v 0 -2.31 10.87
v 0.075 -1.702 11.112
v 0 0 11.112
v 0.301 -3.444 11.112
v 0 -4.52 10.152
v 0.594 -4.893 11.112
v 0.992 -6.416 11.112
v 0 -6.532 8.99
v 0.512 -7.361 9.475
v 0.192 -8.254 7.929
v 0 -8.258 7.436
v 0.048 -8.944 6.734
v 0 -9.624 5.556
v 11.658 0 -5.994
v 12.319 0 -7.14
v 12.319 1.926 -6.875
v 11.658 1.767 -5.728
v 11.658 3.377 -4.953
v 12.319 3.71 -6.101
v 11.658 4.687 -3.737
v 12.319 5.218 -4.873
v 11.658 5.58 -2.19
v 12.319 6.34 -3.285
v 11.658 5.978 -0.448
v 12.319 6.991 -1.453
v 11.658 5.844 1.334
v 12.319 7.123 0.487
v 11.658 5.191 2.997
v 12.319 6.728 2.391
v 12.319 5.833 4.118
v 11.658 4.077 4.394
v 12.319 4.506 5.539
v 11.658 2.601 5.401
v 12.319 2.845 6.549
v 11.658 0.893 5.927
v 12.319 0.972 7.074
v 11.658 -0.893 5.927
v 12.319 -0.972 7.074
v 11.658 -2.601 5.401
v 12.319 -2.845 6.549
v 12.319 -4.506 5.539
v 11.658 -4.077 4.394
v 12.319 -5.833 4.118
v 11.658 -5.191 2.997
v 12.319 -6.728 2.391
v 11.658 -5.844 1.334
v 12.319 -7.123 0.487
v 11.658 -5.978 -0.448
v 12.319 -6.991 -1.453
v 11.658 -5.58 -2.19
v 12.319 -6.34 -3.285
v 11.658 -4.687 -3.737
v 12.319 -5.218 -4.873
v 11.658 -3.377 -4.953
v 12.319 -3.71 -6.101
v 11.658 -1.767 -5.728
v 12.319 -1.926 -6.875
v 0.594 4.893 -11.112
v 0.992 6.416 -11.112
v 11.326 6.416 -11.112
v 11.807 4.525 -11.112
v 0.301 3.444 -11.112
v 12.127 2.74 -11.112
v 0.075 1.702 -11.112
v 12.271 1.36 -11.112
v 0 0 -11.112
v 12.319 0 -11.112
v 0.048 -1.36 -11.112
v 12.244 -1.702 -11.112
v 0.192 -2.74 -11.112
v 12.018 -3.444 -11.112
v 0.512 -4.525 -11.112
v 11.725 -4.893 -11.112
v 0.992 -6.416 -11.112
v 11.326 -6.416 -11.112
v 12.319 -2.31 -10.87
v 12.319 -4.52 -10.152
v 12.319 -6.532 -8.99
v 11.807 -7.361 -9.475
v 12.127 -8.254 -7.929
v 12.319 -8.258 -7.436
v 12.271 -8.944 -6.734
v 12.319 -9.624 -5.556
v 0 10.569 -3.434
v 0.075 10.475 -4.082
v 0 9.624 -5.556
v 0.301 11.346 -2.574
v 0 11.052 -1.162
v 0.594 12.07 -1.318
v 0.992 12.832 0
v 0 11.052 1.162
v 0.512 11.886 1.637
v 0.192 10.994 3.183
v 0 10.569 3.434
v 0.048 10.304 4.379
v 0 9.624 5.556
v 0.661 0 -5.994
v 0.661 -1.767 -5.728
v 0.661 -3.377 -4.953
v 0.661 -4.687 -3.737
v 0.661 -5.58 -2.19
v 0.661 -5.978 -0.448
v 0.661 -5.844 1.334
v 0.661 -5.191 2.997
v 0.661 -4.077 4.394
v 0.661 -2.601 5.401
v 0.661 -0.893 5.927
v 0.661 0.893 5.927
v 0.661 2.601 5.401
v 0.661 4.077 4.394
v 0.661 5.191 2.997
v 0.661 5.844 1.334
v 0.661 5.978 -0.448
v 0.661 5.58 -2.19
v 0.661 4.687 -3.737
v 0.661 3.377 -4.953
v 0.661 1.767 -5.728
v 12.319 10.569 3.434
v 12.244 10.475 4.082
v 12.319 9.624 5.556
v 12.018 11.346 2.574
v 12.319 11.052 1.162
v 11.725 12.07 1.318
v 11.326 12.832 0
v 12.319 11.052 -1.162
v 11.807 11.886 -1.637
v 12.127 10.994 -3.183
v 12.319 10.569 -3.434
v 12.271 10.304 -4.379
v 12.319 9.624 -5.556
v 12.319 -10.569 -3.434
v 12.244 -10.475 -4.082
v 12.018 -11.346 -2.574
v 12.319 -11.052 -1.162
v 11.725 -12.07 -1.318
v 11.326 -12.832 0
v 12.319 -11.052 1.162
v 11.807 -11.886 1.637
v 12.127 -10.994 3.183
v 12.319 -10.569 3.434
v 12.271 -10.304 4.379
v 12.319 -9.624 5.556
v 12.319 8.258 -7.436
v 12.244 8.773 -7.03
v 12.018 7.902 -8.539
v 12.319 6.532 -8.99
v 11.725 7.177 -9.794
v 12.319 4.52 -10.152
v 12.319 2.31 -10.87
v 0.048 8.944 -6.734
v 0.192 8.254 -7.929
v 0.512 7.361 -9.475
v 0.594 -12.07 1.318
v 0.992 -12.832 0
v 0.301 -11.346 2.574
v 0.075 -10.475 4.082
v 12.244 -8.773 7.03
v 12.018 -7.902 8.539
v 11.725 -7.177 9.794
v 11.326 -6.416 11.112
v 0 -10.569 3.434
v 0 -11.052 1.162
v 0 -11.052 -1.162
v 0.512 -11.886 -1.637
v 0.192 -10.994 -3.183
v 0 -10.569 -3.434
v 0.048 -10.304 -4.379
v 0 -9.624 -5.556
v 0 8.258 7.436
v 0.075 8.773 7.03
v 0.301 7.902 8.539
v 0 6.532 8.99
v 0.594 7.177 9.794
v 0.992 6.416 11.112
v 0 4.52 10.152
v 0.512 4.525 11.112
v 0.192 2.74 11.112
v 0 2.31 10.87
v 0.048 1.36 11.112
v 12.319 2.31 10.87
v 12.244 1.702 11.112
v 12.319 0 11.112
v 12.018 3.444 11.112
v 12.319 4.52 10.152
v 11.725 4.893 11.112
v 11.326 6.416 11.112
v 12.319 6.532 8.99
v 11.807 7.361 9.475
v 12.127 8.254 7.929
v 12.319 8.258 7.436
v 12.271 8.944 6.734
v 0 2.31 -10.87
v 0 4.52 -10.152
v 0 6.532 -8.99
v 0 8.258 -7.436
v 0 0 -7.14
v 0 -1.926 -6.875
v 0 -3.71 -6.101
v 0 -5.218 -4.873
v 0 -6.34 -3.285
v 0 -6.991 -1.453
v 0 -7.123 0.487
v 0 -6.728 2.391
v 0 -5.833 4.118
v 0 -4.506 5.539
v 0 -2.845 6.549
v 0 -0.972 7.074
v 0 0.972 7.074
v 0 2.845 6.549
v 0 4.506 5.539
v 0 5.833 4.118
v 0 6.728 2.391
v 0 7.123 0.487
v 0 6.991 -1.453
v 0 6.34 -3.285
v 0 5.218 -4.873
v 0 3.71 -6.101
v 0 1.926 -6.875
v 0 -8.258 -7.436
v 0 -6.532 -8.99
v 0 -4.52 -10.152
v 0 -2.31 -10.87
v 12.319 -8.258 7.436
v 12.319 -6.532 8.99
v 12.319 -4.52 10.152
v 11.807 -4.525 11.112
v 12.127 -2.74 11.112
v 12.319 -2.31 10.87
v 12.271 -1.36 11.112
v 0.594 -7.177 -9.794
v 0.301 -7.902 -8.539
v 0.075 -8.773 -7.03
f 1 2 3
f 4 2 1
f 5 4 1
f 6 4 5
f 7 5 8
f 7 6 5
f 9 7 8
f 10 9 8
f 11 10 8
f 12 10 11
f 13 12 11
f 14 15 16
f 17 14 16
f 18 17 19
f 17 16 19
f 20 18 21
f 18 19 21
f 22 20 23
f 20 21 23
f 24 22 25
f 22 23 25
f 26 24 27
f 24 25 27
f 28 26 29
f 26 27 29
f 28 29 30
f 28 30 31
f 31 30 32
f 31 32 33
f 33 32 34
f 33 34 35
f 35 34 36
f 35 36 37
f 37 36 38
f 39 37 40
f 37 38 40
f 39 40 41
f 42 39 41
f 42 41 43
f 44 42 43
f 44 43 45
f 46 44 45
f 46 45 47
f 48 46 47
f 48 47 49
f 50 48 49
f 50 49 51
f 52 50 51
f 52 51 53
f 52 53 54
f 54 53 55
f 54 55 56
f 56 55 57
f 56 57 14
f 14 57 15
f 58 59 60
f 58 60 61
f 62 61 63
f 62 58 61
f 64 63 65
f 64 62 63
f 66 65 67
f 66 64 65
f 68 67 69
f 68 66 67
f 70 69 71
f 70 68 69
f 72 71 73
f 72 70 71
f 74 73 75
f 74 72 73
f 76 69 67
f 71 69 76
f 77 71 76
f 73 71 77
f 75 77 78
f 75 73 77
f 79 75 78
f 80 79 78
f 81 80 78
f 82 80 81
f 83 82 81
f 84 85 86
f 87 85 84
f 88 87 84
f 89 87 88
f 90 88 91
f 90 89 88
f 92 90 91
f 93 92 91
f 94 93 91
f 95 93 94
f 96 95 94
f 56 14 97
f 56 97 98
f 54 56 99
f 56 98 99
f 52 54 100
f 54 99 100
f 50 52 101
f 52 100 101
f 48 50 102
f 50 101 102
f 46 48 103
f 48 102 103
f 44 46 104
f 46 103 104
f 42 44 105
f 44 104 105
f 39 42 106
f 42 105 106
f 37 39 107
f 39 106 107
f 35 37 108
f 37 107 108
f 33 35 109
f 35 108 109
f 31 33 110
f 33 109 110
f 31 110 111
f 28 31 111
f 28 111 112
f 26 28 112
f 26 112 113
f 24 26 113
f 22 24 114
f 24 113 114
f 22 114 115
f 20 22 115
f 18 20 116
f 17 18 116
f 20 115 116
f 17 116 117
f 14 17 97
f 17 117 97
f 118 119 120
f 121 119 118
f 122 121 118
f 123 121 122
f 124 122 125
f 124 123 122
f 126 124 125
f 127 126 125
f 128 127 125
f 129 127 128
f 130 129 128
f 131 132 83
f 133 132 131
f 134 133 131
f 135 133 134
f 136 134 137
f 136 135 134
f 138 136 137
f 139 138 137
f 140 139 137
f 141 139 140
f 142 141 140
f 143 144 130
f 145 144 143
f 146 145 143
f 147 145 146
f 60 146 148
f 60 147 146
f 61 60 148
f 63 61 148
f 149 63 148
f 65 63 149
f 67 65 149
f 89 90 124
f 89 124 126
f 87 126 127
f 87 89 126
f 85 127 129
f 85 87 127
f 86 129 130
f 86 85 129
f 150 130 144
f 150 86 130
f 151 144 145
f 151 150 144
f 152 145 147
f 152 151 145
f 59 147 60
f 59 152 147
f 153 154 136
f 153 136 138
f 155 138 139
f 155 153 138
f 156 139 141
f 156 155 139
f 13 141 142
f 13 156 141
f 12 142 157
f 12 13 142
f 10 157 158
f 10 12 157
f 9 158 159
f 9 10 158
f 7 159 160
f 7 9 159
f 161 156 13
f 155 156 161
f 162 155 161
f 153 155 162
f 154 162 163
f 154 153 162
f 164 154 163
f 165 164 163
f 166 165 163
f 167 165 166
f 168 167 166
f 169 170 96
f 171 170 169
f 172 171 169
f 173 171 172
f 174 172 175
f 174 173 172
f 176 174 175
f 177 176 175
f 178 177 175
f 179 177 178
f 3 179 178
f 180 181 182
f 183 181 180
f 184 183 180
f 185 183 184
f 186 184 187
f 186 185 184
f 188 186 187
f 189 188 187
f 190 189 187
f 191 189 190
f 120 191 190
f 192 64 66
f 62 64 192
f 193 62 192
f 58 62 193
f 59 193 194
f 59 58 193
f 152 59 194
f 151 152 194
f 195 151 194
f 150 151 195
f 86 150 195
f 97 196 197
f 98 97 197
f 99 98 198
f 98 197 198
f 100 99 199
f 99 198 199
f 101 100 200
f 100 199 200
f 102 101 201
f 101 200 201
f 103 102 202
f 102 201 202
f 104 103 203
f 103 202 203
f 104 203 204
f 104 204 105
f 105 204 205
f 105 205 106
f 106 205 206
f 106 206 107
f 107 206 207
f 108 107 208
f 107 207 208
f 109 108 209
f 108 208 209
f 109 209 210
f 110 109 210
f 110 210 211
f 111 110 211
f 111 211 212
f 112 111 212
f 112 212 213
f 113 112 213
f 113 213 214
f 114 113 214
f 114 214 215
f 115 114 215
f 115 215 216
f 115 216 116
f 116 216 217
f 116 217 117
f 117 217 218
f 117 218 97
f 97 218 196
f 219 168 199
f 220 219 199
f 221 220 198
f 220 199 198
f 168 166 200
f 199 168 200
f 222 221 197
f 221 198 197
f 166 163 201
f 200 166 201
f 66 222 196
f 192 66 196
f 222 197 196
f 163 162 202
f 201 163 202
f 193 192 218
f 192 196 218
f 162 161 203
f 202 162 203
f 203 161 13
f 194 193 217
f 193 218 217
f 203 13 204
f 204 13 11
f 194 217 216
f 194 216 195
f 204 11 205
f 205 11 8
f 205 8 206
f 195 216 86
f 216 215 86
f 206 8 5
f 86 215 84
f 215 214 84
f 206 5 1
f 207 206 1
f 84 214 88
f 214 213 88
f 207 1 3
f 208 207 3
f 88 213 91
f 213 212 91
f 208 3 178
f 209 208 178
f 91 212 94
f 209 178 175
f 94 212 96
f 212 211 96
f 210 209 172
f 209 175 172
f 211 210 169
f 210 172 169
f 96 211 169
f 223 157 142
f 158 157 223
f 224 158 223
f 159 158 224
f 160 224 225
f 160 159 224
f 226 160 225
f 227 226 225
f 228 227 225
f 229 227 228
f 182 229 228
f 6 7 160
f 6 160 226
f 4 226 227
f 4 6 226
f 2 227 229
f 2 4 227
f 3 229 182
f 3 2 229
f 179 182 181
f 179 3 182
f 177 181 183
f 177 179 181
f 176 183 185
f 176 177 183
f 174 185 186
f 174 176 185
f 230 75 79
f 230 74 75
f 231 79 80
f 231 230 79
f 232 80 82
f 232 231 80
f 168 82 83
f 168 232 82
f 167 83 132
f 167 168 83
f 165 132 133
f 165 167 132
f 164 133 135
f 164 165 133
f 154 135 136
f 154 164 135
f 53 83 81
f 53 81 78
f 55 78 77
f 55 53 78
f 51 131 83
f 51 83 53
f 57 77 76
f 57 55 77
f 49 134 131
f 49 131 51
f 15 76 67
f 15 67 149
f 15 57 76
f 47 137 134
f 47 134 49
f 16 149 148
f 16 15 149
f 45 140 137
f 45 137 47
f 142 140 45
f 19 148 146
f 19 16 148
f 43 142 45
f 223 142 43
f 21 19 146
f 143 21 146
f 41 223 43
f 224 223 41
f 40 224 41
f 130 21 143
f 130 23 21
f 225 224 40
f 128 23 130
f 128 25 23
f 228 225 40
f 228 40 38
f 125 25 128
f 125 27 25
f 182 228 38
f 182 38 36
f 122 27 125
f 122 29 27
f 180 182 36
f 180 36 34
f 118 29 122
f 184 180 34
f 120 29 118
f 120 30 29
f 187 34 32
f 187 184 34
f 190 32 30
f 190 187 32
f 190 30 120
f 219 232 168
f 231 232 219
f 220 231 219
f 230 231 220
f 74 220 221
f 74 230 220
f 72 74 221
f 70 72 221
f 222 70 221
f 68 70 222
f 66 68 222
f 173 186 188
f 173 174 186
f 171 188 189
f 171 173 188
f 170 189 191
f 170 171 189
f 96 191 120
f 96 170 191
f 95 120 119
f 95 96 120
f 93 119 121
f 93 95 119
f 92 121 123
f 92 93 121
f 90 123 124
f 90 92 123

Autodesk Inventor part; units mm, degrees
ref_plane "YZ Plane" through (0, 0, 0) normal (1, 0, 0) x (0, 1, 0)
ref_plane "XZ Plane" through (0, 0, 0) normal (0, 1, 0) x (-1, 0, 0)
sketch "Sketch1" plane through (0, 0, 0) normal (1, 0, 0) x (0, 1, 0)
  line L0 (-12.8316, 0) -> (-6.4158, 11.1125)
  line L1 (-6.4158, 11.1125) -> (6.4158, 11.1125)
  line L2 (6.4158, 11.1125) -> (12.8316, 0)
  line L3 (12.8316, 0) -> (6.4158, -11.1125)
  line L4 (6.4158, -11.1125) -> (-6.4158, -11.1125)
  line L5 (-6.4158, -11.1125) -> (-12.8316, 0)
  point P0 (0, 0)
  point P1 (0, 0)
  dimension "d0" = 25.6632
extrude "Body" add sketch "Sketch1" along normal blind 12.319
sketch "Sketch2" plane through (0, 0, 0) normal (0, 0, 1) x (1, 0, 0)
  line L0 (0, 6.4158) -> (0, 12.8316) projected
  line L1 (0, 12.8316) -> (12.319, 12.8316) projected
  line L2 (12.319, 6.4158) -> (12.319, 12.8316) projected
  line L3 (-2.4638, 0) -> (14.7828, 0) projected
  line L4 (0.9925, 12.8316) -> (0, 11.1125)
  line L5 (11.3265, 12.8316) -> (12.319, 11.1125)
  dimension "d3" = 30
  dimension "d4" = 30
  dimension "d5" = 22.225
  dimension "d6" = 22.225
revolve "Chamfer1" cut sketch "Sketch2" angle 360 about axis through (-10, 0, 0) along (1, 0, 0)
sketch "Sketch3" plane through (12.319, 0, 0) normal (1, 0, 0) x (0, 0, -1)
  arc A0 (-5.5562, -9.6237) -> (5.5563, -9.6237) centre (0, 0) ccw projected
hole "Thread" at (12.319, 0, 0) direction (-1, 0, 0) diameter 11.9888 end through all thread size "9/16-12 UNC" class "2B" standard "ANSI Unified Screw Threads"
chamfer "Chamfer2" distance 1.1457 angle 30 1 edges at (12.319, 0, 5.9944) measured on face at (12.319, -9.3513, -0.2408)
chamfer "Chamfer3" distance 1.1457 angle 30 1 edges at (0, 0, 5.9944) measured on face at (0, -9.3513, -0.2408)
ref_plane "Work Plane1" through (-23.7962, 0, 0) normal (0, -0.866, -0.5) x (1, 0, 0)
equation "\"d0\" = 1.1547 * SW"
equation "\"d1\" = KOH"
equation "\"d3\" = ANG1"
equation "\"d4\" = ANG2"
equation "\"d5\" = SW0"
equation "\"d6\" = SW01"
equation "\"d8\" = -0.5 * GD1 + 0.5 * NND"
equation "\"d40\" = -0.5 * GD1 + 0.5 * NND"
equation "\"d10\" = -0.5 * GD1 + 0.5 * NND"
equation "\"d41\" = -0.5 * GD1 + 0.5 * NND"
equation "\"ANG1\" = 30deg"
equation "\"ANG2\" = 30deg"
equation "\"NND\" = 14.2875"
equation "\"KOH\" = 12.319"
equation "\"SW\" = 22.225"
equation "\"SW0\" = SW"
equation "\"SW01\" = SW"
equation "\"THREADDIA\" = 14.2875"
equation "\"TOA\" = 30deg"
equation "\"E0\" = 1.155 * SW"
equation "\"GD1\" = 11.996141"
properties part number "ANSI B18.2.2 - 9/16 - 12, HNI" material "Steel, Mild"
